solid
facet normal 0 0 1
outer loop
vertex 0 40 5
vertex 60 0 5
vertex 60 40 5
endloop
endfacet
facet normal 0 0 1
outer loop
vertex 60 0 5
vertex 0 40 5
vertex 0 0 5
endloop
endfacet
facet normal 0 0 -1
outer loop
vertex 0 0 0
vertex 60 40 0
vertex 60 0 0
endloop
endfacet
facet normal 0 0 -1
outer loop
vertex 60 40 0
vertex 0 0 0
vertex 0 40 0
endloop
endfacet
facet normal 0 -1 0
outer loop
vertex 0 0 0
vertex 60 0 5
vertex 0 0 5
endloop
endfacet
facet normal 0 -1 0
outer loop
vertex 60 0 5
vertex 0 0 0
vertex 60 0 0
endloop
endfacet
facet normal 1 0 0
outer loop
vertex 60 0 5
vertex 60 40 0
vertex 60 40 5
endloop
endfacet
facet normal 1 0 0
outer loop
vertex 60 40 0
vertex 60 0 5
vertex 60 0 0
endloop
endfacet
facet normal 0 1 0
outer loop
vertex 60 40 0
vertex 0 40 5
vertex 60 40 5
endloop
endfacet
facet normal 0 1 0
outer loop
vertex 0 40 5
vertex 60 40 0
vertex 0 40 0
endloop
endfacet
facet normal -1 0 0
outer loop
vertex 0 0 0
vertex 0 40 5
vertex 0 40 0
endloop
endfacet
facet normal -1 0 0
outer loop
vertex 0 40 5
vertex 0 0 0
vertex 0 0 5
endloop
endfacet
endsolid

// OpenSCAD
// Rectangular spacer plate, one corner at the origin.
plate_x = 60;
plate_y = 40;
plate_z = 5;

module spacer() {
    cube([plate_x, plate_y, plate_z]);
}

spacer();
